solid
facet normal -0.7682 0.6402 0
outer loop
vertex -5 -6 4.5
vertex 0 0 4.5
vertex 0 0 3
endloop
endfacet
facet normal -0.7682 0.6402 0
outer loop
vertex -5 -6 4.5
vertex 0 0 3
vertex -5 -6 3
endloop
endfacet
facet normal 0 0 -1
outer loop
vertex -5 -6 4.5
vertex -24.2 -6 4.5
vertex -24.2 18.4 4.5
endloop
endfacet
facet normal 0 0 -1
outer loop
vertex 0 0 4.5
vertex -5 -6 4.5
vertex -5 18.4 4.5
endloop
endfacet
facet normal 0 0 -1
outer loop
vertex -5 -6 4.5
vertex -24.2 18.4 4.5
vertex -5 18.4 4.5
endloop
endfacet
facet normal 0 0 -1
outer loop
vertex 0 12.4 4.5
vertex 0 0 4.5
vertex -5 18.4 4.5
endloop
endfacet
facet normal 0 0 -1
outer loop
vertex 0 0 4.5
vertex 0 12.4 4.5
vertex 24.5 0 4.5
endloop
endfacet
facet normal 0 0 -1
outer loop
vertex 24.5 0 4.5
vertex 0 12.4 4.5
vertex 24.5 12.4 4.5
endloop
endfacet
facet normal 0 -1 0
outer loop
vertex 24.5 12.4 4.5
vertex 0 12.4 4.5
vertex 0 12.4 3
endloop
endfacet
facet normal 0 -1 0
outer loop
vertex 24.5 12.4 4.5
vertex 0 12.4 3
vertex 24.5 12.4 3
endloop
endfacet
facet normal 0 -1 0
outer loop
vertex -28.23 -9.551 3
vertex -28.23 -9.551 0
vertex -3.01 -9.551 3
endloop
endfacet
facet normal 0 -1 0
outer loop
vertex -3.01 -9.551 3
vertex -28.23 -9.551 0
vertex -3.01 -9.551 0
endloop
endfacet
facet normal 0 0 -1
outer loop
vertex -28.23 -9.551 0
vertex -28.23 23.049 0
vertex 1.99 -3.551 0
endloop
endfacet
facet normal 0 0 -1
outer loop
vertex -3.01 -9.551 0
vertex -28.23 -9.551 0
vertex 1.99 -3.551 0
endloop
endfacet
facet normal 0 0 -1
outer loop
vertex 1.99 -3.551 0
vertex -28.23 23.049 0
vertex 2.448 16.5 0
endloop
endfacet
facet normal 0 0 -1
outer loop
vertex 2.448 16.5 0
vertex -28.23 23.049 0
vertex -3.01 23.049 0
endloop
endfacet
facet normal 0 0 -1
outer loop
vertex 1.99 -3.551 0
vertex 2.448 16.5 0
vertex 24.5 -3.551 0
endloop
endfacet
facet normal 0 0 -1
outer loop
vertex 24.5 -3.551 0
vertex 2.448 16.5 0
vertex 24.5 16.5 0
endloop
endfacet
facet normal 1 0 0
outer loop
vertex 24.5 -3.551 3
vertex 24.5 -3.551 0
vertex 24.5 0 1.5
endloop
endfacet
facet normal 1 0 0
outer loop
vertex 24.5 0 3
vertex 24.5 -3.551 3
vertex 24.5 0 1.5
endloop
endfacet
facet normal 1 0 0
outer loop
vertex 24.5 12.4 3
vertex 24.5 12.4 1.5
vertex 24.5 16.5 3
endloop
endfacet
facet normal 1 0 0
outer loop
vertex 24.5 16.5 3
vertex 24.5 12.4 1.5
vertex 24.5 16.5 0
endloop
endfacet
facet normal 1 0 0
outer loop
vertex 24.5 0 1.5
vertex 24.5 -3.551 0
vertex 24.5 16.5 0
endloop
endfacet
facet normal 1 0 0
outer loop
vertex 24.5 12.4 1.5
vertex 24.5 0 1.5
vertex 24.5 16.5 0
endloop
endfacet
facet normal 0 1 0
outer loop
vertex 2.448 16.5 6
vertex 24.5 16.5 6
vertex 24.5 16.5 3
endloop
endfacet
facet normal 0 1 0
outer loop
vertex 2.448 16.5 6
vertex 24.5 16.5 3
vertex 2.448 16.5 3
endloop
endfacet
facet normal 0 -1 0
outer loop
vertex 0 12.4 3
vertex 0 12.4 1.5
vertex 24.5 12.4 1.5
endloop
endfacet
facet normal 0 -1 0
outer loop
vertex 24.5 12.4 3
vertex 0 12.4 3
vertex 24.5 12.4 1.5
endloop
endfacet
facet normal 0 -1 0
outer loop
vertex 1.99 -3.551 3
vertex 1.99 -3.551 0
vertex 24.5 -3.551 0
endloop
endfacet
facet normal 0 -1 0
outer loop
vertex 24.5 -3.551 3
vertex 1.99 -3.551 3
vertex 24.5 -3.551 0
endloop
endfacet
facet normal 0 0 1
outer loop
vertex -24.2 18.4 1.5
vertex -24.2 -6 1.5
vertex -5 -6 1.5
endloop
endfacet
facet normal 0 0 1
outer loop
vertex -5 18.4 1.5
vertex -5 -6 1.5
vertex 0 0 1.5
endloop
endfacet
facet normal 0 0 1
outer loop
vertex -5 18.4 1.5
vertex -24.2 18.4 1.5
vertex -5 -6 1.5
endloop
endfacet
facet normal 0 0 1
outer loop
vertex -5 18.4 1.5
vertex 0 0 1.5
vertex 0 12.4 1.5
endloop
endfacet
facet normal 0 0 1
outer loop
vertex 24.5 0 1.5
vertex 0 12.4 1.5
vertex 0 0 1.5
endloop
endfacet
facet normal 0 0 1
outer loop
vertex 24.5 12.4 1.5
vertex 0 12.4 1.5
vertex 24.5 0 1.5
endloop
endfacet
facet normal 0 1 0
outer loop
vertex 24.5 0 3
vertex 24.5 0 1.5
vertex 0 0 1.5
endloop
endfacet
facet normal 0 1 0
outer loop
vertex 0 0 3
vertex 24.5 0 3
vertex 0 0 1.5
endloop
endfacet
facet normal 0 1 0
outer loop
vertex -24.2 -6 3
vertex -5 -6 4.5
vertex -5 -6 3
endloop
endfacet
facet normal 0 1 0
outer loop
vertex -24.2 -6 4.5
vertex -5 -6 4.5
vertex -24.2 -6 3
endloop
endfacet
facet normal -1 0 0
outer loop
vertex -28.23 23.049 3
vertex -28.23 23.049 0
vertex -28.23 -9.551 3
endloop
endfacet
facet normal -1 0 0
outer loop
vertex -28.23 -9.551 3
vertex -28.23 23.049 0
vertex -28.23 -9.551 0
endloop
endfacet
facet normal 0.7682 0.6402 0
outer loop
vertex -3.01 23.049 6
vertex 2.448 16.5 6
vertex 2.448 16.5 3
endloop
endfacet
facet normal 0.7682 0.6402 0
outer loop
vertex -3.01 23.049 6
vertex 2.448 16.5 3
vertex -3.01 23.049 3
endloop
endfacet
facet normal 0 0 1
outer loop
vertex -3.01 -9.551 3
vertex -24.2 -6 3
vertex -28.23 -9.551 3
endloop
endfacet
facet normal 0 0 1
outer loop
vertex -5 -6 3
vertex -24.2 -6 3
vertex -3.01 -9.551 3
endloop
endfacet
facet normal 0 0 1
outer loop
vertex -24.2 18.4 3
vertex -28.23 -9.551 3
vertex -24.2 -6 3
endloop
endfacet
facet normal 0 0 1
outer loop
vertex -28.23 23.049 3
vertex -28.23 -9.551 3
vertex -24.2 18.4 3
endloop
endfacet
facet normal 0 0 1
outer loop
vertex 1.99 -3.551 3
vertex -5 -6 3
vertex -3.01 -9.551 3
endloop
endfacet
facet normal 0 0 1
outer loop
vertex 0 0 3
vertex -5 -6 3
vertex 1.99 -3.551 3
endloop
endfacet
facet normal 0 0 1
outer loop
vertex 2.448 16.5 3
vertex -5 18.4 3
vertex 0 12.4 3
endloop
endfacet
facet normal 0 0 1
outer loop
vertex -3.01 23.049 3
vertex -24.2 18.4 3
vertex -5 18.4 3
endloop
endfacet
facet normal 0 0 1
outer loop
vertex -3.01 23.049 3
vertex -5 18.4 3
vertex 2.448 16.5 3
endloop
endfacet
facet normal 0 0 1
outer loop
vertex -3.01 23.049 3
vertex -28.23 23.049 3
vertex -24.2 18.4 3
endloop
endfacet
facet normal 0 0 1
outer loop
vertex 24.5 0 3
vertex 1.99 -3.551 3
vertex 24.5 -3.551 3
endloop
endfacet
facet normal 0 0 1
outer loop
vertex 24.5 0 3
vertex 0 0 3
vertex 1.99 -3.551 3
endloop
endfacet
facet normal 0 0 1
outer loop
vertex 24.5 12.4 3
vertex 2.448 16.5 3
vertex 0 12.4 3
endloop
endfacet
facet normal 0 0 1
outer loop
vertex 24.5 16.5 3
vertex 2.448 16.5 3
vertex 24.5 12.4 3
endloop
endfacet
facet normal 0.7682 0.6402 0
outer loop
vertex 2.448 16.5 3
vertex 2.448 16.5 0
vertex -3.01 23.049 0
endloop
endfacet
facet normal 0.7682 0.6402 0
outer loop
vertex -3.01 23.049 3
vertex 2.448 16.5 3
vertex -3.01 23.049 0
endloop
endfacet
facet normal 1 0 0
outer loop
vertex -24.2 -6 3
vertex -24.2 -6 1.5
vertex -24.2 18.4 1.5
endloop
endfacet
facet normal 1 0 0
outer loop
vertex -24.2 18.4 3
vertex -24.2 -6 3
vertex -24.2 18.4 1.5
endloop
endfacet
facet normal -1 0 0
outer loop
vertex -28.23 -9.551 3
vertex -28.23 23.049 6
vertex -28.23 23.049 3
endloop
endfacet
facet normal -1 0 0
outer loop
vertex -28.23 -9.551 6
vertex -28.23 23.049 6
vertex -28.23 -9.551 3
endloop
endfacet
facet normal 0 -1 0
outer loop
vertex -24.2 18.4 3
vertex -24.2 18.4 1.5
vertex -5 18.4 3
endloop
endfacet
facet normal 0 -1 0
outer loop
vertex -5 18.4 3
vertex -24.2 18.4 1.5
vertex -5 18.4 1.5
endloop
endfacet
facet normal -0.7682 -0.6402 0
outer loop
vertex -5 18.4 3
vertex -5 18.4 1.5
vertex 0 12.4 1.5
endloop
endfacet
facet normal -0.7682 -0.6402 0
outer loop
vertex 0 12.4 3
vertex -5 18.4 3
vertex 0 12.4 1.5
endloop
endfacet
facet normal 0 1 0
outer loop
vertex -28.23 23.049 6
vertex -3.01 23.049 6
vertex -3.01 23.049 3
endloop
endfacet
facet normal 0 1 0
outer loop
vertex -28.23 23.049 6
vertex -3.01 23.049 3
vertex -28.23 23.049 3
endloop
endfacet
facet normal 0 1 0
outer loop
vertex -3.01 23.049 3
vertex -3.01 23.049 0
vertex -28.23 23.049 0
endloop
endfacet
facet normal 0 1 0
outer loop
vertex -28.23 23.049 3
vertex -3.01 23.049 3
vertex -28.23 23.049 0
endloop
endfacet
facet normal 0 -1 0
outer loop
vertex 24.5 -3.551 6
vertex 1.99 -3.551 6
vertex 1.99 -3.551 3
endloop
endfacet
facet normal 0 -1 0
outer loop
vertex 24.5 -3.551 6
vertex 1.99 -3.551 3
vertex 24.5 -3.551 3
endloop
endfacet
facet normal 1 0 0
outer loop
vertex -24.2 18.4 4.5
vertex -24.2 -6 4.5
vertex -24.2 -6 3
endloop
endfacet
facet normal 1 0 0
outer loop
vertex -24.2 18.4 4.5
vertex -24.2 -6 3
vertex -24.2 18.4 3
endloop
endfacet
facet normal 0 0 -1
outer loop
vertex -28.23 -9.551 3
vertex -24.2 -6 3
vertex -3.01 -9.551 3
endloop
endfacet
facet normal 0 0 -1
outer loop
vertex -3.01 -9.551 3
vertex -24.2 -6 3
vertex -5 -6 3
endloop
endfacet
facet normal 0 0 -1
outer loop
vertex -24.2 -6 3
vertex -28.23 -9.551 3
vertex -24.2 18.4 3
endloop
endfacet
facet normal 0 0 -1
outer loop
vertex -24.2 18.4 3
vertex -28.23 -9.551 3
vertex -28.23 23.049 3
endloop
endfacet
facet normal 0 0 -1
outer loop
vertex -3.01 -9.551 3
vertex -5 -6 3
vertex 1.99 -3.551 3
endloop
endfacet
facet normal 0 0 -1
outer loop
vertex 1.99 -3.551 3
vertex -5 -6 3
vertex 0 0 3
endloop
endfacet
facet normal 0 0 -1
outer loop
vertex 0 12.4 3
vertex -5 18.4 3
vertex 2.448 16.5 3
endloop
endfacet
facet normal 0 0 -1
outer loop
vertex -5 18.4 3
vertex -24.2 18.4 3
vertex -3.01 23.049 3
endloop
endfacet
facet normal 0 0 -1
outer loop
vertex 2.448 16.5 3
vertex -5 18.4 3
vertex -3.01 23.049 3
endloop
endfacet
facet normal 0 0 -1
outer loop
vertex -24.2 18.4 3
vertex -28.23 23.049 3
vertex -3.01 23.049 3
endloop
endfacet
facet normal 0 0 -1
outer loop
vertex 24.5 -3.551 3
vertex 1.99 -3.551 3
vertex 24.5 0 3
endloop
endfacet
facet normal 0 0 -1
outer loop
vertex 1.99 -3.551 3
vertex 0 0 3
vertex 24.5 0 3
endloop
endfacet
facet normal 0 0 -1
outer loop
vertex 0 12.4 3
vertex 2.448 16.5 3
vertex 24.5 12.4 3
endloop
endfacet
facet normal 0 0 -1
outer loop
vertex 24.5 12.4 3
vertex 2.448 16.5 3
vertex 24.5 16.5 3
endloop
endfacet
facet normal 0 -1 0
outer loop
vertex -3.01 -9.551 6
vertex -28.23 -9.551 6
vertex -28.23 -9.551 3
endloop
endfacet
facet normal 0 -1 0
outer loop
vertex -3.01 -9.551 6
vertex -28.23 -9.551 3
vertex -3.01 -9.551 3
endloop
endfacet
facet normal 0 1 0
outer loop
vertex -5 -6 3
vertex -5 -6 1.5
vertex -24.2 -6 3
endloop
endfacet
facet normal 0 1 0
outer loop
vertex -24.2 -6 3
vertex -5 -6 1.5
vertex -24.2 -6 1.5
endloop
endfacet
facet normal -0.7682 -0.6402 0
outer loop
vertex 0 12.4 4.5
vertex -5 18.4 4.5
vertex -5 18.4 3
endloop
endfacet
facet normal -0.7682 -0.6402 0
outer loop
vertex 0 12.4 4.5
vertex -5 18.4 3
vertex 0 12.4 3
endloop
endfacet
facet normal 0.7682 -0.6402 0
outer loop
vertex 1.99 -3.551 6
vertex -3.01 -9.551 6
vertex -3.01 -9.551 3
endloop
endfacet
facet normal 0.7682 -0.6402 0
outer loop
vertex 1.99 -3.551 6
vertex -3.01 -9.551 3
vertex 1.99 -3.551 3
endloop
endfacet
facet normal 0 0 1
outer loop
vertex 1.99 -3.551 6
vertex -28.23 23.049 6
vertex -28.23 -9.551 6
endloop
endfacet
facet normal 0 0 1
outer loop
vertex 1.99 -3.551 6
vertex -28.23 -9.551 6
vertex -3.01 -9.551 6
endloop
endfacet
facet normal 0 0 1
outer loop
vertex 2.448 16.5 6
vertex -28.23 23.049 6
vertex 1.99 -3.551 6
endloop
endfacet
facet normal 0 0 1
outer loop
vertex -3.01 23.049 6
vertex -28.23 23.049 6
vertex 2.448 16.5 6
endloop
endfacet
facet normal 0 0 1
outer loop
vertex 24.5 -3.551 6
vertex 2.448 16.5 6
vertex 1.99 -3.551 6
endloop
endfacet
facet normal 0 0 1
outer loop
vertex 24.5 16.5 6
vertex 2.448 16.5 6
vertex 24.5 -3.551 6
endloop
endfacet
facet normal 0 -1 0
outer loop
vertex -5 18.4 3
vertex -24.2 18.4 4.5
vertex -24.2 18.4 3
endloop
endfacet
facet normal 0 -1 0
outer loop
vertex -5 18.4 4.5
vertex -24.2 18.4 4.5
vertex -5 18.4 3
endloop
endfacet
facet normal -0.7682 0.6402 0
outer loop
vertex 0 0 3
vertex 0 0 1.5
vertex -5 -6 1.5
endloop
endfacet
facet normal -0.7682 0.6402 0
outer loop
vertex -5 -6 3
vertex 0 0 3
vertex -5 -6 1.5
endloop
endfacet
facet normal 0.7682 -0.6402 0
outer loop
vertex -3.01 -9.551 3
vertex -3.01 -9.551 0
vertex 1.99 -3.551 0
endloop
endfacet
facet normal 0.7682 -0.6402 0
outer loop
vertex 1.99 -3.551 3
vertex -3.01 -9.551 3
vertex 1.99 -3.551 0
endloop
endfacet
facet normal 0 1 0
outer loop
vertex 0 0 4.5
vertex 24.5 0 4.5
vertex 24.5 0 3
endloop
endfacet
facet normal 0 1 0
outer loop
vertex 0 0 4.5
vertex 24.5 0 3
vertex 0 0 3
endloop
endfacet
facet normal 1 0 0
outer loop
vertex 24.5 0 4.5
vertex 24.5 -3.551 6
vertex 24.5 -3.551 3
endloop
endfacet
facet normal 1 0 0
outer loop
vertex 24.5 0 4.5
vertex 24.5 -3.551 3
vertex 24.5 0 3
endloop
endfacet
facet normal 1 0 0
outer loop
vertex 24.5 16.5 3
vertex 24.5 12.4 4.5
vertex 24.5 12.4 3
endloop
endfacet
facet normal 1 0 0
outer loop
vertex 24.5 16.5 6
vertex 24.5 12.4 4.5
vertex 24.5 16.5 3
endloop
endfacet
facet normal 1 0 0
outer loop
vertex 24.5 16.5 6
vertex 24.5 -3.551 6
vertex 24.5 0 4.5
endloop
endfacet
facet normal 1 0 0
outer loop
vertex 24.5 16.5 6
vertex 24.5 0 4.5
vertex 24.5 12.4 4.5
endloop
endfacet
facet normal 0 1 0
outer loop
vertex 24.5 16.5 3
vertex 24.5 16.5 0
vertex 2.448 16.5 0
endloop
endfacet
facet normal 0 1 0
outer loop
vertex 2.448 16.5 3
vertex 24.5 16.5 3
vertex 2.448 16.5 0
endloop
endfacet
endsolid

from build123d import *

# Parameters (mm, degrees)
F1_DEPTH = 3
F2_DEPTH = 1.5


with BuildPart() as f1:
    # F0 (on Top) → F1 (new body)
    with BuildSketch(Plane.XY):
        Polygon((-24.2, -6), (-24.2, 18.4), (-5, 18.4), (0, 12.4), (24.5, 12.4), (24.5, 16.5), (2.448029, 16.5), (-3.009612, 23.049168), (-28.229949, 23.049168), (-28.229949, -9.550845), (-3.009612, -9.550845), (1.990388, -3.550845), (24.5, -3.550845), (24.5, 0), (0, 0), (-5, -6), align=None)
    extrude(amount=F1_DEPTH)

    # F0 (on Top) → F2 (join)
    with BuildSketch(Plane.XY):
        Polygon((-5, 18.4), (-24.2, 18.4), (-24.2, -6), (-5, -6), (0, 0), (24.5, 0), (24.5, 12.4), (0, 12.4), align=None)
        Polygon((-24.2, -6), (-24.2, 18.4), (-5, 18.4), (0, 12.4), (24.5, 12.4), (24.5, 16.5), (2.448029, 16.5), (-3.009612, 23.049168), (-28.229949, 23.049168), (-28.229949, -9.550845), (-3.009612, -9.550845), (1.990388, -3.550845), (24.5, -3.550845), (24.5, 0), (0, 0), (-5, -6), align=None)
    extrude(amount=F2_DEPTH)


with BuildPart() as f3_1:
    # F3: instance of F1
    add(f1.part.mirror(Plane(origin=(-6.607222, 7.398073, 3), x_dir=(1, 0, 0), z_dir=(0, 0, 1))))


solid = Compound([f1.part, f3_1.part])
